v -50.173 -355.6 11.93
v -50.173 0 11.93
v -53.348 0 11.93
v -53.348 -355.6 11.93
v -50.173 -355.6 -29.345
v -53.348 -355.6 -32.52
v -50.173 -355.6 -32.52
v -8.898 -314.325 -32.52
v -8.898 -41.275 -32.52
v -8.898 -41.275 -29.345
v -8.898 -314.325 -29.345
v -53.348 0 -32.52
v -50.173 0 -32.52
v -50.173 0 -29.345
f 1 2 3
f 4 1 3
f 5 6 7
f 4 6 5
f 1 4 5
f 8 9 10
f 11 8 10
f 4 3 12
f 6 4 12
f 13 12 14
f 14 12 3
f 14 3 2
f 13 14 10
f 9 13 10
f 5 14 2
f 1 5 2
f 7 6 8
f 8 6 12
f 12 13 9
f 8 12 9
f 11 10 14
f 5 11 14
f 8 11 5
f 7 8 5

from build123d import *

# Parameters (mm, degrees)
F1_DEPTH = 355.6
F3_DEPTH = 25.4
F5_DEPTH = 25.4


with BuildPart() as f1:
    # F0 (on Front) → F1 (new body)
    with BuildSketch(Plane.XZ):
        Polygon((-53.348197, 11.929806), (-53.348197, -32.520194), (-8.898197, -32.520194), (-8.898197, -29.345194), (-50.173197, -29.345194), (-50.173197, 11.929806), align=None)
    extrude(amount=F1_DEPTH)

    # F2 (on face) → F3 (cut)
    with BuildSketch(Plane.XY.offset(-29.345194)):
        Polygon((-50.173197, 0), (-8.898197, -41.275), (-8.898197, 0), align=None)
    extrude(amount=-F3_DEPTH, mode=Mode.SUBTRACT)

    # F4 (on face) → F5 (cut)
    with BuildSketch(Plane.XY.offset(-29.345194)):
        Polygon((-8.898197, -355.6), (-8.898197, -314.325), (-50.173197, -355.6), align=None)
    extrude(amount=-F5_DEPTH, mode=Mode.SUBTRACT)


solid = f1.part
